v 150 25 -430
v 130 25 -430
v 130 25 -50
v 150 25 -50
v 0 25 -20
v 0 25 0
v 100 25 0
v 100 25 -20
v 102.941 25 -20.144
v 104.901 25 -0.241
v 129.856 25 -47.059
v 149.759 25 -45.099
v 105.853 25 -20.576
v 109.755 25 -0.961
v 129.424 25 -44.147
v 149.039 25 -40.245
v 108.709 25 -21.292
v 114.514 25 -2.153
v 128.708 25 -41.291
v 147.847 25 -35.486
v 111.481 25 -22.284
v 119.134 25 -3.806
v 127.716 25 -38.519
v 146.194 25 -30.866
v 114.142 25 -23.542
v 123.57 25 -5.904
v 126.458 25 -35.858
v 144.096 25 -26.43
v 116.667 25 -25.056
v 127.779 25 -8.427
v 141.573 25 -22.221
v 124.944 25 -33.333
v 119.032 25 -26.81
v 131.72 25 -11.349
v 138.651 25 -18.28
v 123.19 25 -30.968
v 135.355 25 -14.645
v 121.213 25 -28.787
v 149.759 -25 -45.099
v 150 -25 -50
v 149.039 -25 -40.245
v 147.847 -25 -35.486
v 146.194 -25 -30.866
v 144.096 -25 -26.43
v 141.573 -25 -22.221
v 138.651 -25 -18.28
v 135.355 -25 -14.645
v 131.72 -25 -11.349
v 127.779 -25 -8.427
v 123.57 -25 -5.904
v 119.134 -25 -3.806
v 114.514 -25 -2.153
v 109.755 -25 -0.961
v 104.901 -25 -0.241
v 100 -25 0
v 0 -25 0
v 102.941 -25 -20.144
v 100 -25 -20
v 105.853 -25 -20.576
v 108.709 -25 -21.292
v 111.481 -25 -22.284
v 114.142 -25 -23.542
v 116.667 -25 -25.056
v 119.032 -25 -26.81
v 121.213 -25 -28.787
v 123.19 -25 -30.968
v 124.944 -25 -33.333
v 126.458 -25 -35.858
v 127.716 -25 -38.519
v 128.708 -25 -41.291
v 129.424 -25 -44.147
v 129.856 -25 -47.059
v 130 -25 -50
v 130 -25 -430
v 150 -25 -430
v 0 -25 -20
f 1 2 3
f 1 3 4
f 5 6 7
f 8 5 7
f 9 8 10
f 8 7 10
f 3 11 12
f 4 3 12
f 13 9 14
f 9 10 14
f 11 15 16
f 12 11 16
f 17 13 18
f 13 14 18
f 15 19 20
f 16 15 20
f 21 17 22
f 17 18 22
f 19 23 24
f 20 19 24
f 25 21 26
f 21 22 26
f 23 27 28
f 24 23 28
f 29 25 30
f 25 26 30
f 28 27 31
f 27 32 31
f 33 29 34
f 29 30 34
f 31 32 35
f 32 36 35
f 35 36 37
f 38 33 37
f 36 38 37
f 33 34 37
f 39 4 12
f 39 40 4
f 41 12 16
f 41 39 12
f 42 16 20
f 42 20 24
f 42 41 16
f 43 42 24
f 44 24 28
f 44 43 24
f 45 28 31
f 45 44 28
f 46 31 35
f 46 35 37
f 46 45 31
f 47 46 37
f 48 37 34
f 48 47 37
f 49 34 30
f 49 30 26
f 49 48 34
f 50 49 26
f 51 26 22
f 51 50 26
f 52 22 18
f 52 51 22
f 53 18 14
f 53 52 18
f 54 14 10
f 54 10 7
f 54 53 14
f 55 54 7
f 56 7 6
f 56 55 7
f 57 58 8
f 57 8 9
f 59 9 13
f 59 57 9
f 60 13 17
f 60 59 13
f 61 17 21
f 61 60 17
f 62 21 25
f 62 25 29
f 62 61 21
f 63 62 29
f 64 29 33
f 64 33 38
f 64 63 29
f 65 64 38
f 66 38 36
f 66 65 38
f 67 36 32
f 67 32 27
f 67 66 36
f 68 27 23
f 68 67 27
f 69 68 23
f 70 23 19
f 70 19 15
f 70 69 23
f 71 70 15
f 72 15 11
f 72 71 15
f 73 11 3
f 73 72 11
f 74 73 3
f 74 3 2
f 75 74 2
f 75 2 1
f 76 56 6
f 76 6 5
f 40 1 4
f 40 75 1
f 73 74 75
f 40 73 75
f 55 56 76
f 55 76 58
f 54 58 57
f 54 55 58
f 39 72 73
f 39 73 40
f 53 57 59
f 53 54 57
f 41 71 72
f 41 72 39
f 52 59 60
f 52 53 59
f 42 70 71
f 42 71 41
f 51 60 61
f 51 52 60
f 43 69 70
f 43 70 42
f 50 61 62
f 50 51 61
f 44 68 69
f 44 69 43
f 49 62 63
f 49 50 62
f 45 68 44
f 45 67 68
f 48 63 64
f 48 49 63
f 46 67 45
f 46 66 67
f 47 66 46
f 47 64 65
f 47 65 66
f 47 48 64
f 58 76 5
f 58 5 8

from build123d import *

# Parameters (mm, degrees)
F1_DEPTH      = 25
F1_DEPTH_BACK = 25


with BuildPart() as f1:
    # F0 (on Front) → F1 (new body, two sides)
    with BuildSketch(Plane.XZ) as f1_sk:
        with BuildLine():
            Line((100, 0), (0, 0))
            Line((0, 0), (0, -20))
            Line((0, -20), (100, -20))
            ThreePointArc((100, -20), (121.213203, -28.786797), (130, -50))
            Line((130, -50), (130, -430))
            Line((130, -430), (150, -430))
            Line((150, -430), (150, -50))
            ThreePointArc((150, -50), (135.355339, -14.644661), (100, 0))
        make_face()
    extrude(amount=F1_DEPTH)
    extrude(f1_sk.sketch, amount=-F1_DEPTH_BACK)


solid = f1.part
